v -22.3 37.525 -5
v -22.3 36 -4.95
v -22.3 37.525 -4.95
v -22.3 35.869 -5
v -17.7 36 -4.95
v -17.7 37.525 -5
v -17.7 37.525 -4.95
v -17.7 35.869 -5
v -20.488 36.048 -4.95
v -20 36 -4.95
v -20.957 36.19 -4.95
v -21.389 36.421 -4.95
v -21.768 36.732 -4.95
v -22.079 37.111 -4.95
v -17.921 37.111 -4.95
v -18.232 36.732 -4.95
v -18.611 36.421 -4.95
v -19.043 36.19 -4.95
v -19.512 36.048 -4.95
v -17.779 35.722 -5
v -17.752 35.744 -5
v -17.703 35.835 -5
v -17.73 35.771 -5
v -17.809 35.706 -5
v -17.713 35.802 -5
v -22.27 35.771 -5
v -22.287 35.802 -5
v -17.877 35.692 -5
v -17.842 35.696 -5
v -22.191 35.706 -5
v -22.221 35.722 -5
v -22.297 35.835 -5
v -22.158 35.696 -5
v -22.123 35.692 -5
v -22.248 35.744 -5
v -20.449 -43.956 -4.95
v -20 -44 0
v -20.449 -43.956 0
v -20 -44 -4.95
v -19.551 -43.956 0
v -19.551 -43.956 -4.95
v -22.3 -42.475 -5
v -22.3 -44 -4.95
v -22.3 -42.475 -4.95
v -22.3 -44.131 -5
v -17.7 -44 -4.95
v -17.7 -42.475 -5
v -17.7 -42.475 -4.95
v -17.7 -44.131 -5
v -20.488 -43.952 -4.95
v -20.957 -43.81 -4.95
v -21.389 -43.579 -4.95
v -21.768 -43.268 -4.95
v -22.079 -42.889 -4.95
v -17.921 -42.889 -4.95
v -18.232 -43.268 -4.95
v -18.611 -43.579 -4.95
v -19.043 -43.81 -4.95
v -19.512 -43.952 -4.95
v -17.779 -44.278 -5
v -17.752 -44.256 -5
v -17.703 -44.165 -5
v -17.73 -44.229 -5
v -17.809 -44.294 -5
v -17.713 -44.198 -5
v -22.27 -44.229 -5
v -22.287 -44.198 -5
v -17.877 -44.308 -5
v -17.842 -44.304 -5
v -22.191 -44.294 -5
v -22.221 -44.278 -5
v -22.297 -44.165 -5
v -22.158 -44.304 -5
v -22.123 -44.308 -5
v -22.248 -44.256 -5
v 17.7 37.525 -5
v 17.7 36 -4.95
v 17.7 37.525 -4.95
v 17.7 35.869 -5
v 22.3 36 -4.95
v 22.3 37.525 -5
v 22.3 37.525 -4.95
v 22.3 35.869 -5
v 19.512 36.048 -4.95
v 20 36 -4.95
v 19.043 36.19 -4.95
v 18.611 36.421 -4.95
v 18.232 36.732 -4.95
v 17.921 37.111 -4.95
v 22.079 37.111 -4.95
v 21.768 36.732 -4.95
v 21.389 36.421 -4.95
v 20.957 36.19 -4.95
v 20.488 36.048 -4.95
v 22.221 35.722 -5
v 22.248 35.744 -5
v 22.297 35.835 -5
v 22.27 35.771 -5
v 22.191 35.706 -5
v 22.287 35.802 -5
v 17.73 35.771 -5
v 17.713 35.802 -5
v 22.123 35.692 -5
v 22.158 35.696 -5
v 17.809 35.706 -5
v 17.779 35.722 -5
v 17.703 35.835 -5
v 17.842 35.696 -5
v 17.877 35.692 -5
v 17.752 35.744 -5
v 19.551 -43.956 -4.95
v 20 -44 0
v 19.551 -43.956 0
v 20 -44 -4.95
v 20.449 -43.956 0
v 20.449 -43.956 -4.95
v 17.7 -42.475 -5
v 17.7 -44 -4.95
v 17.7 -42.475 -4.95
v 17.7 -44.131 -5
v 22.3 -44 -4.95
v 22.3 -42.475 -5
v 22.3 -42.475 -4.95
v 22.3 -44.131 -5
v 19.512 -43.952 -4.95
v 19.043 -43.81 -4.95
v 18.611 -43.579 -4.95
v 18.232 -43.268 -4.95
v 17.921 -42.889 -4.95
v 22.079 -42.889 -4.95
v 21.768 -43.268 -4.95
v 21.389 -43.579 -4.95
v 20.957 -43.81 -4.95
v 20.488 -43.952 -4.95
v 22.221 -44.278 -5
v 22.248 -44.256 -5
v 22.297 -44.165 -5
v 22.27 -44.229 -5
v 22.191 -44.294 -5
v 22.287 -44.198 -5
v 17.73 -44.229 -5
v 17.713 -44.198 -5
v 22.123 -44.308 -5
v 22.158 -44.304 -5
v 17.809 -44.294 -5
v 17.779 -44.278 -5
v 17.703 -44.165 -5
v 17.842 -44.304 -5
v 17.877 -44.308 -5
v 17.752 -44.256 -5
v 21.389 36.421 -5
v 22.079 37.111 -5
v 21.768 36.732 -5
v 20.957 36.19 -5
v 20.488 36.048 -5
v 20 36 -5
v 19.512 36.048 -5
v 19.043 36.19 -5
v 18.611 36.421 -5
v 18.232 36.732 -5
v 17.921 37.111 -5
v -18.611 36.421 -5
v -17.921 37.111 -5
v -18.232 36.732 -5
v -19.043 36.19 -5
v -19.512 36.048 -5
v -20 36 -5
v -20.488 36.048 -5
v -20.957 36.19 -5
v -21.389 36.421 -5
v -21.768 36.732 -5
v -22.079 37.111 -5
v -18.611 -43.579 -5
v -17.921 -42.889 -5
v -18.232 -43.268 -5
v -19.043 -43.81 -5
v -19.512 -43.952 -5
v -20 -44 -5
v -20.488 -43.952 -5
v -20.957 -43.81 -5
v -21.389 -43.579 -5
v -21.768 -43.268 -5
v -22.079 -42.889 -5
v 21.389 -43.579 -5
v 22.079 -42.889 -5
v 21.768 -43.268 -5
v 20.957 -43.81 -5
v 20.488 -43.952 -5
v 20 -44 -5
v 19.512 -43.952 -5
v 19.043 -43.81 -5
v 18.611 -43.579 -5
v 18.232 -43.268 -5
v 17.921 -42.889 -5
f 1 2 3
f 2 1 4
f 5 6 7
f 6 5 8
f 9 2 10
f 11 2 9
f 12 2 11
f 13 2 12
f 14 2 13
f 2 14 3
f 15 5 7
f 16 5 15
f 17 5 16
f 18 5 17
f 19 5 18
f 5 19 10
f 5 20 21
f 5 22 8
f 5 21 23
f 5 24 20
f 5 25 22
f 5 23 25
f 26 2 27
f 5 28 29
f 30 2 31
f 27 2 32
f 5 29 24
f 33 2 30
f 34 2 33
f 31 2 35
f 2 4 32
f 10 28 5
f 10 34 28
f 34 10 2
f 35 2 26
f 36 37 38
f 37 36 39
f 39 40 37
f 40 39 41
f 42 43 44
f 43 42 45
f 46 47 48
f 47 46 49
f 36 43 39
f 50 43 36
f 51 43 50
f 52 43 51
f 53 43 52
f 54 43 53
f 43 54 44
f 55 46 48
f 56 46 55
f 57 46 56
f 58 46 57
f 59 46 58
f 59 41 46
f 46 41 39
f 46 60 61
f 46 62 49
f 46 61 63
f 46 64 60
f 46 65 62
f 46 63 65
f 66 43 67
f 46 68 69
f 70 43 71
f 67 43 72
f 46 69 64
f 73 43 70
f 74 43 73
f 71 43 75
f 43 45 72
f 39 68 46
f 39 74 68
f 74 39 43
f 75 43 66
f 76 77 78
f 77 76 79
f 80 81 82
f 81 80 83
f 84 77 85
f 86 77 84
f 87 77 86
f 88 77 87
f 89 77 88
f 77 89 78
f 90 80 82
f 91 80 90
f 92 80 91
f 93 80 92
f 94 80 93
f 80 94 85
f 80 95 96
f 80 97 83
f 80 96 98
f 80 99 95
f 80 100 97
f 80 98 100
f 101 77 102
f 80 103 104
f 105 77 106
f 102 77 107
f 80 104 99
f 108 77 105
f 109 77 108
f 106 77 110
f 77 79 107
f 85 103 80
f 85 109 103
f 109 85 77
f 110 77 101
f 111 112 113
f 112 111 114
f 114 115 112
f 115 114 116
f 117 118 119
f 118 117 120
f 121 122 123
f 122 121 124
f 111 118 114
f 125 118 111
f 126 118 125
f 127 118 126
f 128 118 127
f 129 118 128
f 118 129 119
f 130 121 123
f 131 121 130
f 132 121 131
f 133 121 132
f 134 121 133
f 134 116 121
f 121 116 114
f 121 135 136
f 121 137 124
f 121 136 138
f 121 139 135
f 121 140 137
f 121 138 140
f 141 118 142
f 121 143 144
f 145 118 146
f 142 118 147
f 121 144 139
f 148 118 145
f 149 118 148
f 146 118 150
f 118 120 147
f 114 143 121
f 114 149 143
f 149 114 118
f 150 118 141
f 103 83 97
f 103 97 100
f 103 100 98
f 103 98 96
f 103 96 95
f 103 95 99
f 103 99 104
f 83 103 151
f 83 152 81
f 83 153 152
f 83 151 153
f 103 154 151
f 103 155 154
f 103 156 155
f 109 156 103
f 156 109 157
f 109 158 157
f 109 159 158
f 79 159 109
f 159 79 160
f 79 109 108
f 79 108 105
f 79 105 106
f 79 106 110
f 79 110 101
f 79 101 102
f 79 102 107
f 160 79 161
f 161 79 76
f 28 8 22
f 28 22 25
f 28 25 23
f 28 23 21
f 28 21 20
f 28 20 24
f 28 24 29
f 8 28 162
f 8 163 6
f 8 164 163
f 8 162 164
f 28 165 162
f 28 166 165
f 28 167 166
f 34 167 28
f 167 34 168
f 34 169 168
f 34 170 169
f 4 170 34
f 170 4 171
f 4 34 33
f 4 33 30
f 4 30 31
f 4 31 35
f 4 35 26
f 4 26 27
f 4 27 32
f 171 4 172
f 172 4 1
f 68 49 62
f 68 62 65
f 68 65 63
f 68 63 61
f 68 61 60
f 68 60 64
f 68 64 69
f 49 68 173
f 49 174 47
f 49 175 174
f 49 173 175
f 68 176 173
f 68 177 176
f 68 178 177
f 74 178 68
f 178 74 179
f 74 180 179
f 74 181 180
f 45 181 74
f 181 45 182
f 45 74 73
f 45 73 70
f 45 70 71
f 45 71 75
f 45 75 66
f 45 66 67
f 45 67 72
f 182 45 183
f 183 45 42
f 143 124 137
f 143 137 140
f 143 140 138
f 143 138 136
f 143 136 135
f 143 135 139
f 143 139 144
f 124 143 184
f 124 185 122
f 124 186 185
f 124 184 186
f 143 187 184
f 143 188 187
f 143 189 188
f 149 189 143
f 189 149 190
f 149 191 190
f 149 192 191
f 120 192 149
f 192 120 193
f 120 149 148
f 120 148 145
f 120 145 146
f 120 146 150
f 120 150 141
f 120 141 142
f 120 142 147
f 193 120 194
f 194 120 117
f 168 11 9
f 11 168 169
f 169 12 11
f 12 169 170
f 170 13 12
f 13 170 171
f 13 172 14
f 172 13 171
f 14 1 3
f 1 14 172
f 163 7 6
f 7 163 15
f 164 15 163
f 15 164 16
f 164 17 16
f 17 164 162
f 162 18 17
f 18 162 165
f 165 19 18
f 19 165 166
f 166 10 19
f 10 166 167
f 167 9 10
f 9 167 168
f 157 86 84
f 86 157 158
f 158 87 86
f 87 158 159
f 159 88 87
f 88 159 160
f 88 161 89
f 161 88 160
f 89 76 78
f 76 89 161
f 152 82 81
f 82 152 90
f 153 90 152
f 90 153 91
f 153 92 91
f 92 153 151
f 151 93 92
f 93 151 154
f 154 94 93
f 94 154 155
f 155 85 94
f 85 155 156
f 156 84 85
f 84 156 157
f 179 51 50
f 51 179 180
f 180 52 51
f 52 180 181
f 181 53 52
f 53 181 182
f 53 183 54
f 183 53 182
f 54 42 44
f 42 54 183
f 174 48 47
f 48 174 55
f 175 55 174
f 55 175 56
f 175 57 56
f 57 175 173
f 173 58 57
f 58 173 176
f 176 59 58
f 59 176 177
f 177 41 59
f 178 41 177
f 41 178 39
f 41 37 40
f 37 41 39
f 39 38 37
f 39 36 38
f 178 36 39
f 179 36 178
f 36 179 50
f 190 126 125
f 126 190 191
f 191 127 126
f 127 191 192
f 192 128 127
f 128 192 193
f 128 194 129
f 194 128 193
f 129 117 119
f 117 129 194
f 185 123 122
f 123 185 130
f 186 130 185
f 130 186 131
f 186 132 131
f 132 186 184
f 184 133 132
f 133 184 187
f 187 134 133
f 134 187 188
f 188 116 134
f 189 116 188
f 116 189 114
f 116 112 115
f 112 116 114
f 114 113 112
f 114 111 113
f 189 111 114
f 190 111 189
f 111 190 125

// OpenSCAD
include <lib.scad>
// board slots for this holder: top-hook slots and peg slots (seated frame)
slot_bot_hook = hook_y - stem_h/2;
module slot2d() hull() { translate([0, 2.5]) circle(2.5); translate([0, 12.5]) circle(2.5); }
module slots2d() for (p = mount_pts) translate([p[0], p[1] - stem_h/2]) slot2d();
module board(t, dy) translate([0, dy, -t]) linear_extrude(t)
    difference() { translate([-100, -100]) square([300, 200]); slots2d(); }
mode = 0;
// 0: seated, board 5.0 -> expect only the thin wedge pinch
if (mode == 0) intersection() { mounts(); board(5.0, 0); }
// 1: insertion, holder 10 up, board infinite in z -> must be empty
if (mode == 1) intersection() { translate([0, drop, 0]) mounts(); translate([0, 0, 50]) board(100, 0); }
// 2: seated on a 4.9 / 5.1 board
if (mode == 2) intersection() { mounts(); board(4.9, 0); }
if (mode == 3) intersection() { mounts(); board(5.1, 0); }
// 4: drop sweep - holder at each drop height on a 5.0 board, report interference
if (mode == 4) intersection() { translate([0, drop, 0]) mounts(); board(5.0, 0); }
